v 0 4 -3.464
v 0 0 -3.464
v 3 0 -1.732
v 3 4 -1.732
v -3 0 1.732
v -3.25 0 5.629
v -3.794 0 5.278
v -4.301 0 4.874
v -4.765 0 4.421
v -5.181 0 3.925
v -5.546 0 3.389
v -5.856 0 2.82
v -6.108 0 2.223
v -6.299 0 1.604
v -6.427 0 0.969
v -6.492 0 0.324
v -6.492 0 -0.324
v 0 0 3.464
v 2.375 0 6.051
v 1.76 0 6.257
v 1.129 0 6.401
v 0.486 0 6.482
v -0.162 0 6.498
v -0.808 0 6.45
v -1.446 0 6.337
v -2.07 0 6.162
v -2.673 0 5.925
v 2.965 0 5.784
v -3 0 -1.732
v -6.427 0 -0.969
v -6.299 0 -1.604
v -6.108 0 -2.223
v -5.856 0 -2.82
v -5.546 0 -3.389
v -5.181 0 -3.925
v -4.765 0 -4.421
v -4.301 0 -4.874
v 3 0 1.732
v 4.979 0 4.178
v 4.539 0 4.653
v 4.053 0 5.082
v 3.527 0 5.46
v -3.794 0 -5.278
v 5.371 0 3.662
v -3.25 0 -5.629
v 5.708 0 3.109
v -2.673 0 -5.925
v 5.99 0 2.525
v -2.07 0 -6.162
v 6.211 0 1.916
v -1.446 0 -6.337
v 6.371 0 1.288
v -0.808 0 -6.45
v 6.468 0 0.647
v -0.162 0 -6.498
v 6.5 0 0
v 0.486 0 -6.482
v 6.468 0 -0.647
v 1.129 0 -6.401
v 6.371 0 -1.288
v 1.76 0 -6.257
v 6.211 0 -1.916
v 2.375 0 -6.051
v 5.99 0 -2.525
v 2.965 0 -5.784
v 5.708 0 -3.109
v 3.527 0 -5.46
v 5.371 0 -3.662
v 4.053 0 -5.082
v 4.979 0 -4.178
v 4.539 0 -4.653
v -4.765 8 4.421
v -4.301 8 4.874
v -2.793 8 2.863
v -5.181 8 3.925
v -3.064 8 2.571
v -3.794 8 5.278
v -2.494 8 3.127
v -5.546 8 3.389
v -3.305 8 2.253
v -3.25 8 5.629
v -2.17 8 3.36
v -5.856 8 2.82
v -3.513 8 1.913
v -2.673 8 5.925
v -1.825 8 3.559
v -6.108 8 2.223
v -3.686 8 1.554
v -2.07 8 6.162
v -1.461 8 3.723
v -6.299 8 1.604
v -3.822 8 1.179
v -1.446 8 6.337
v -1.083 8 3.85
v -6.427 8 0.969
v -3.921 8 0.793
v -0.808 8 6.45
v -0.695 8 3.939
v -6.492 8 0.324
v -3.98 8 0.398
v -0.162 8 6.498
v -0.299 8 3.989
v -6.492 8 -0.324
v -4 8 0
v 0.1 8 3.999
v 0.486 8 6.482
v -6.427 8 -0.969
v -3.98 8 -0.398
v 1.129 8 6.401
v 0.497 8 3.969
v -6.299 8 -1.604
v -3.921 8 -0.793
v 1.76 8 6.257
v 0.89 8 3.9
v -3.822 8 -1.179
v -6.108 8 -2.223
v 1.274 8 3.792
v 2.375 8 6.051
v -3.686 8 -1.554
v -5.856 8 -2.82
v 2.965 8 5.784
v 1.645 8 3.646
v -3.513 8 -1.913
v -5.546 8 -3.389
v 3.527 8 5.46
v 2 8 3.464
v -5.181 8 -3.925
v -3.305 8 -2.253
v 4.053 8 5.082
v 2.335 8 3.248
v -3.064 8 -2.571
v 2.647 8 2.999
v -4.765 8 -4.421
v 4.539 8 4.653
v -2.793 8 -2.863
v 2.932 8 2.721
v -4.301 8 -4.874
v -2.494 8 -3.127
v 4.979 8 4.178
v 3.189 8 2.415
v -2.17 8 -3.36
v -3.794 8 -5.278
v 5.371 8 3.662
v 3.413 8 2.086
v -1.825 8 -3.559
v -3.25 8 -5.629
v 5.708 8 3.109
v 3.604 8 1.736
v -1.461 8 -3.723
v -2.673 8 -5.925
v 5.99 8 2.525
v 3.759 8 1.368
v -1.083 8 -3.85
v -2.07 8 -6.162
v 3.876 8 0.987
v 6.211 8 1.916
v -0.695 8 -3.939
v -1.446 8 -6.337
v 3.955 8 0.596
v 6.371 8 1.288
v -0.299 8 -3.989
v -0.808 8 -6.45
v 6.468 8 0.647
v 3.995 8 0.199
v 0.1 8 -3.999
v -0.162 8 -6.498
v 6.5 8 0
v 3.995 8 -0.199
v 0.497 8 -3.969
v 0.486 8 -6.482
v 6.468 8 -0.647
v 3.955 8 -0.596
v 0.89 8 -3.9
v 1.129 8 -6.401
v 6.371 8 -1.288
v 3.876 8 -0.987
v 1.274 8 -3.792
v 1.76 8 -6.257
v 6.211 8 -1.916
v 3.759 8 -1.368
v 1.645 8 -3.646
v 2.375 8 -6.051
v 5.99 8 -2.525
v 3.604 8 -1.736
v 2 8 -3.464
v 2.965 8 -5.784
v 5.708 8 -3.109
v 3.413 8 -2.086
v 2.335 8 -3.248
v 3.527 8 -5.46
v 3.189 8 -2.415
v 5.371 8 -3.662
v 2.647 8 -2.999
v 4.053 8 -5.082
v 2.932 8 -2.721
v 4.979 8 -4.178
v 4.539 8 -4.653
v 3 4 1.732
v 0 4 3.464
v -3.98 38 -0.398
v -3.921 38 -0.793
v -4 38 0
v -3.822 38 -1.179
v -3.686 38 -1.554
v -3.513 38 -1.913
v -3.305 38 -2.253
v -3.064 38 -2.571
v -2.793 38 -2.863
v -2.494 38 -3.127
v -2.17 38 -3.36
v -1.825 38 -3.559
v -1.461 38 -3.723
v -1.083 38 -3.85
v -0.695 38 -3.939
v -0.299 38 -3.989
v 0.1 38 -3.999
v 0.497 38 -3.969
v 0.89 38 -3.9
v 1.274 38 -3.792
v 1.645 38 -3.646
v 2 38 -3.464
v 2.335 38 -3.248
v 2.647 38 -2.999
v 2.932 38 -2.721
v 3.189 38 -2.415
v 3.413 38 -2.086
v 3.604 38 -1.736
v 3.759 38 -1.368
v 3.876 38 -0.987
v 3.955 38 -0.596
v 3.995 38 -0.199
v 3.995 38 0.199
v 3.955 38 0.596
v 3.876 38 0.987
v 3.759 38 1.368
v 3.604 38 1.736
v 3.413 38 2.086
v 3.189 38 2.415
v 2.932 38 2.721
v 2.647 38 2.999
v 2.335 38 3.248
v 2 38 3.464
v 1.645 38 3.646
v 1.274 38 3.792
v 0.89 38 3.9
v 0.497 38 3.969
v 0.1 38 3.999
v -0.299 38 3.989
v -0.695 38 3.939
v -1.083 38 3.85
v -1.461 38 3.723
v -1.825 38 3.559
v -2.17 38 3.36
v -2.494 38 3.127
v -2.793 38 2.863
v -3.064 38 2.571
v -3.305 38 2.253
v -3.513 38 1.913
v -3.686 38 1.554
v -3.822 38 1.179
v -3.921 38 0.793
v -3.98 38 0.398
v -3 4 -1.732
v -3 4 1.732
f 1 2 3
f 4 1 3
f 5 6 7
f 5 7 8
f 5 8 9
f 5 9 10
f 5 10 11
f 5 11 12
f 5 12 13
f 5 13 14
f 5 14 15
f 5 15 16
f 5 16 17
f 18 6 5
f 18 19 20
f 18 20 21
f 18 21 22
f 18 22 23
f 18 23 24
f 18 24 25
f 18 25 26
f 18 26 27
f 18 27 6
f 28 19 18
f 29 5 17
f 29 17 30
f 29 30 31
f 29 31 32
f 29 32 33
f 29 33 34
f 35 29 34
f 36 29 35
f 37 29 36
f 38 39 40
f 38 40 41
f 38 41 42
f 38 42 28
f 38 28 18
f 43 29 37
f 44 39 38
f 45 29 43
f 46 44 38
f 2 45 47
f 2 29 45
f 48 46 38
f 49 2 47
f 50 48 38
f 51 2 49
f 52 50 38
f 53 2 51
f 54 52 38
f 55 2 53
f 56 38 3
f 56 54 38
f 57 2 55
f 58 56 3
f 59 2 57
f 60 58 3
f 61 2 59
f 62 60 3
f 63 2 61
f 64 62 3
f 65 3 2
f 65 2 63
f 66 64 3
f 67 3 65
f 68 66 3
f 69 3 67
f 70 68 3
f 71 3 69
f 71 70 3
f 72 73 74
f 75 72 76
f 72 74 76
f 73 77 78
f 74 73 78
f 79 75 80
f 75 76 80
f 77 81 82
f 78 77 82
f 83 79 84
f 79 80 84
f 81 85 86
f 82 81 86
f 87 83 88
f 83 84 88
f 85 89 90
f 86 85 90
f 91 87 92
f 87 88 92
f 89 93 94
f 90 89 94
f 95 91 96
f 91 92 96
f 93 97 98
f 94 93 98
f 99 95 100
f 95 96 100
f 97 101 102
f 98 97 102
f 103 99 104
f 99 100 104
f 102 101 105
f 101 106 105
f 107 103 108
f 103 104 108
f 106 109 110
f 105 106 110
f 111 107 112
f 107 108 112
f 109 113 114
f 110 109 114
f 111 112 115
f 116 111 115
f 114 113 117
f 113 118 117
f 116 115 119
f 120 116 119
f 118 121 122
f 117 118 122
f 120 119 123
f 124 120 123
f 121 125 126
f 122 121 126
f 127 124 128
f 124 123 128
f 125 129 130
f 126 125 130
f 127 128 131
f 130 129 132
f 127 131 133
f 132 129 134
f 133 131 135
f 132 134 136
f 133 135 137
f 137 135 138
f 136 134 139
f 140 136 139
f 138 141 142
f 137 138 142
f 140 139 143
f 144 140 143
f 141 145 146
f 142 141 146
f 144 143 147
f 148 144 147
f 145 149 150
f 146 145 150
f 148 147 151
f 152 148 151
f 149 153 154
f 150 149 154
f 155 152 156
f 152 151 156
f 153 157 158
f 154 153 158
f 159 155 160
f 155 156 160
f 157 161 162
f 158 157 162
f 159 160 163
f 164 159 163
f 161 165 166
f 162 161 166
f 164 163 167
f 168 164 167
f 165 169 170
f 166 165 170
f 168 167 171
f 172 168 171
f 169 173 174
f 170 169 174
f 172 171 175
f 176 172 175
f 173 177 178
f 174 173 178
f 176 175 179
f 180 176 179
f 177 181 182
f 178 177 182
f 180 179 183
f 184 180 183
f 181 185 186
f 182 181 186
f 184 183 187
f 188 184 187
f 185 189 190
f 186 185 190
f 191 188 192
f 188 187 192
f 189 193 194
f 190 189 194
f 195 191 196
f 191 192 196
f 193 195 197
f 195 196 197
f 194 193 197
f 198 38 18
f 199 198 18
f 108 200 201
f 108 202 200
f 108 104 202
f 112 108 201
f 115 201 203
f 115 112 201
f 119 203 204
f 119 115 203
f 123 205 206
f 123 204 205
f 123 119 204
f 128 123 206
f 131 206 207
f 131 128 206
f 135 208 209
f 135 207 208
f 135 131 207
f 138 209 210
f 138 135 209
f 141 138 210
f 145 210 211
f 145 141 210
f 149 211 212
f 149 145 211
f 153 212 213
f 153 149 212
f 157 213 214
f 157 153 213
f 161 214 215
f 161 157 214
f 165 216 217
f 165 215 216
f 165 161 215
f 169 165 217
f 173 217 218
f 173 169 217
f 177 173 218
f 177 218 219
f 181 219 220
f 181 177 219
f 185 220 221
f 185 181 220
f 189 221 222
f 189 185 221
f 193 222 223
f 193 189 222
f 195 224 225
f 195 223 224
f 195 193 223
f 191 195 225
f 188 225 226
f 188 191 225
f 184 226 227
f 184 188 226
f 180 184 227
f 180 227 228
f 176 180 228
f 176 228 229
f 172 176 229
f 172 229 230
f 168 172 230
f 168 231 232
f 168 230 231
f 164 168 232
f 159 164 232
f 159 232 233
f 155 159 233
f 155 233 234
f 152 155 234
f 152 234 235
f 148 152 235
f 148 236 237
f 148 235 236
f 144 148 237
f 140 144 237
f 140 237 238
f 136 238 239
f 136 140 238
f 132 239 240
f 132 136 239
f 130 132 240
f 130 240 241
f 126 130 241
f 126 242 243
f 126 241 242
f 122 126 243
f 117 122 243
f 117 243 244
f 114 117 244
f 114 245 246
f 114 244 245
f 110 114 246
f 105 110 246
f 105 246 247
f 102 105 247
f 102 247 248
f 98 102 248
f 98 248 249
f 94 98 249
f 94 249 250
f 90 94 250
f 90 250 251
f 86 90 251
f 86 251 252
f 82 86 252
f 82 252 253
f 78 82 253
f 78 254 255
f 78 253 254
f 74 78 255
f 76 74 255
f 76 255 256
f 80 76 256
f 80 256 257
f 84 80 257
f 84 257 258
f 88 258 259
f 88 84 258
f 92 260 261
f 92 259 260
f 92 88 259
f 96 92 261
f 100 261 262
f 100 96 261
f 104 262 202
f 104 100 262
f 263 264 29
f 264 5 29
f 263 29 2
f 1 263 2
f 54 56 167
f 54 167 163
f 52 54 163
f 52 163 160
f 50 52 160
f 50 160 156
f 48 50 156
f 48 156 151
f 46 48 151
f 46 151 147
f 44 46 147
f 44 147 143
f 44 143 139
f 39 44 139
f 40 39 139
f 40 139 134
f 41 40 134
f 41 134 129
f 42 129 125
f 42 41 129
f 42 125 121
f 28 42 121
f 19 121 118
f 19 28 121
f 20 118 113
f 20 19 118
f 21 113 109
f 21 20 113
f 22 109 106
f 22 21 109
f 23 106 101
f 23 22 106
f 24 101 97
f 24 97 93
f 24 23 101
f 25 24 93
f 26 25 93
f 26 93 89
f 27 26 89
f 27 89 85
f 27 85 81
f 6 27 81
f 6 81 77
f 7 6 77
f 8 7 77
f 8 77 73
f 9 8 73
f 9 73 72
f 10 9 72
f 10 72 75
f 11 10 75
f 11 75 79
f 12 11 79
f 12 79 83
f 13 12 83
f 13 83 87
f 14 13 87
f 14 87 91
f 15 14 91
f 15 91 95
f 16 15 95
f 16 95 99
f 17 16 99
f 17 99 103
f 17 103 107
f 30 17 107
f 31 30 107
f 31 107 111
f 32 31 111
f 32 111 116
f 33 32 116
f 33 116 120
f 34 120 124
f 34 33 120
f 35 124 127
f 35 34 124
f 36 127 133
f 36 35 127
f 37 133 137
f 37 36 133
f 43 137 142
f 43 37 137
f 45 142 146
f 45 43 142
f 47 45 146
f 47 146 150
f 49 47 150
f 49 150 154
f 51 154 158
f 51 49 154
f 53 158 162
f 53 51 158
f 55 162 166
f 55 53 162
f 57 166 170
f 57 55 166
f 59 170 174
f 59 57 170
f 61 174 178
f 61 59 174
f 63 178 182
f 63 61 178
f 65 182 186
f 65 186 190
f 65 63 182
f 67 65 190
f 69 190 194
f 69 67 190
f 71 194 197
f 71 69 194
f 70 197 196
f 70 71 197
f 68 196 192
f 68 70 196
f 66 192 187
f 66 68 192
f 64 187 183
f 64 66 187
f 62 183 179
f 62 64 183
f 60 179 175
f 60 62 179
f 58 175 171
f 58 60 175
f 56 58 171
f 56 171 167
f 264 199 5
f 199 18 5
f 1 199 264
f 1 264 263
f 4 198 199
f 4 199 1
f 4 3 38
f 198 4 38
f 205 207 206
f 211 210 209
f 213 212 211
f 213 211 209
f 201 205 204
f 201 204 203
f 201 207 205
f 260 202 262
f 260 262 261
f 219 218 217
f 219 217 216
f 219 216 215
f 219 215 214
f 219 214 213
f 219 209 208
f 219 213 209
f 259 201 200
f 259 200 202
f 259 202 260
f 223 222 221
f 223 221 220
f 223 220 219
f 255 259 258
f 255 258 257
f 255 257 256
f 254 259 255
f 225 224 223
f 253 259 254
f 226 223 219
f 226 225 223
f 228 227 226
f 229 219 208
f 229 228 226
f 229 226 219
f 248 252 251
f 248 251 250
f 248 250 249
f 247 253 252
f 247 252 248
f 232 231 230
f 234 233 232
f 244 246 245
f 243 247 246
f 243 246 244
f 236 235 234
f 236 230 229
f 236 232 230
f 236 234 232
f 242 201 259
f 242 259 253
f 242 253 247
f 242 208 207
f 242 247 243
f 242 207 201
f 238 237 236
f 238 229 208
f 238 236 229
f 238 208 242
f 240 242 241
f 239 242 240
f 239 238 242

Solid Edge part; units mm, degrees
sketch "Sketch1" plane through (0, 0, 0) normal (0, -1, 0) x (1, 0, 0)
  circle A0 centre (0, 0) radius 6.5
extrude "Protrusion1" add sketch "Sketch1" against normal blind 8
sketch "Sketch2" plane through (0, 0, 0) normal (0, -1, 0) x (1, 0, 0)
  line L0 (3, 1.7321) -> (0, 3.4641)
  line L1 (0, 3.4641) -> (-3, 1.7321)
  line L2 (-3, 1.7321) -> (-3, -1.7321)
  line L3 (-3, -1.7321) -> (0, -3.4641)
  line L4 (0, -3.4641) -> (3, -1.7321)
  line L5 (3, -1.7321) -> (3, 1.7321)
extrude "ExtrudedCutout_1" cut sketch "Sketch2" against normal blind 4
sketch "Sketch3" plane through (0, 8, 0) normal (0, 1, 0) x (-1, 0, 0)
  circle A0 centre (0, 0) radius 4
extrude "ExtrudedProtrusion_2" add sketch "Sketch3" along normal blind 30
cosmetic_thread "Thread1" size "M8"
properties material "Steel"
